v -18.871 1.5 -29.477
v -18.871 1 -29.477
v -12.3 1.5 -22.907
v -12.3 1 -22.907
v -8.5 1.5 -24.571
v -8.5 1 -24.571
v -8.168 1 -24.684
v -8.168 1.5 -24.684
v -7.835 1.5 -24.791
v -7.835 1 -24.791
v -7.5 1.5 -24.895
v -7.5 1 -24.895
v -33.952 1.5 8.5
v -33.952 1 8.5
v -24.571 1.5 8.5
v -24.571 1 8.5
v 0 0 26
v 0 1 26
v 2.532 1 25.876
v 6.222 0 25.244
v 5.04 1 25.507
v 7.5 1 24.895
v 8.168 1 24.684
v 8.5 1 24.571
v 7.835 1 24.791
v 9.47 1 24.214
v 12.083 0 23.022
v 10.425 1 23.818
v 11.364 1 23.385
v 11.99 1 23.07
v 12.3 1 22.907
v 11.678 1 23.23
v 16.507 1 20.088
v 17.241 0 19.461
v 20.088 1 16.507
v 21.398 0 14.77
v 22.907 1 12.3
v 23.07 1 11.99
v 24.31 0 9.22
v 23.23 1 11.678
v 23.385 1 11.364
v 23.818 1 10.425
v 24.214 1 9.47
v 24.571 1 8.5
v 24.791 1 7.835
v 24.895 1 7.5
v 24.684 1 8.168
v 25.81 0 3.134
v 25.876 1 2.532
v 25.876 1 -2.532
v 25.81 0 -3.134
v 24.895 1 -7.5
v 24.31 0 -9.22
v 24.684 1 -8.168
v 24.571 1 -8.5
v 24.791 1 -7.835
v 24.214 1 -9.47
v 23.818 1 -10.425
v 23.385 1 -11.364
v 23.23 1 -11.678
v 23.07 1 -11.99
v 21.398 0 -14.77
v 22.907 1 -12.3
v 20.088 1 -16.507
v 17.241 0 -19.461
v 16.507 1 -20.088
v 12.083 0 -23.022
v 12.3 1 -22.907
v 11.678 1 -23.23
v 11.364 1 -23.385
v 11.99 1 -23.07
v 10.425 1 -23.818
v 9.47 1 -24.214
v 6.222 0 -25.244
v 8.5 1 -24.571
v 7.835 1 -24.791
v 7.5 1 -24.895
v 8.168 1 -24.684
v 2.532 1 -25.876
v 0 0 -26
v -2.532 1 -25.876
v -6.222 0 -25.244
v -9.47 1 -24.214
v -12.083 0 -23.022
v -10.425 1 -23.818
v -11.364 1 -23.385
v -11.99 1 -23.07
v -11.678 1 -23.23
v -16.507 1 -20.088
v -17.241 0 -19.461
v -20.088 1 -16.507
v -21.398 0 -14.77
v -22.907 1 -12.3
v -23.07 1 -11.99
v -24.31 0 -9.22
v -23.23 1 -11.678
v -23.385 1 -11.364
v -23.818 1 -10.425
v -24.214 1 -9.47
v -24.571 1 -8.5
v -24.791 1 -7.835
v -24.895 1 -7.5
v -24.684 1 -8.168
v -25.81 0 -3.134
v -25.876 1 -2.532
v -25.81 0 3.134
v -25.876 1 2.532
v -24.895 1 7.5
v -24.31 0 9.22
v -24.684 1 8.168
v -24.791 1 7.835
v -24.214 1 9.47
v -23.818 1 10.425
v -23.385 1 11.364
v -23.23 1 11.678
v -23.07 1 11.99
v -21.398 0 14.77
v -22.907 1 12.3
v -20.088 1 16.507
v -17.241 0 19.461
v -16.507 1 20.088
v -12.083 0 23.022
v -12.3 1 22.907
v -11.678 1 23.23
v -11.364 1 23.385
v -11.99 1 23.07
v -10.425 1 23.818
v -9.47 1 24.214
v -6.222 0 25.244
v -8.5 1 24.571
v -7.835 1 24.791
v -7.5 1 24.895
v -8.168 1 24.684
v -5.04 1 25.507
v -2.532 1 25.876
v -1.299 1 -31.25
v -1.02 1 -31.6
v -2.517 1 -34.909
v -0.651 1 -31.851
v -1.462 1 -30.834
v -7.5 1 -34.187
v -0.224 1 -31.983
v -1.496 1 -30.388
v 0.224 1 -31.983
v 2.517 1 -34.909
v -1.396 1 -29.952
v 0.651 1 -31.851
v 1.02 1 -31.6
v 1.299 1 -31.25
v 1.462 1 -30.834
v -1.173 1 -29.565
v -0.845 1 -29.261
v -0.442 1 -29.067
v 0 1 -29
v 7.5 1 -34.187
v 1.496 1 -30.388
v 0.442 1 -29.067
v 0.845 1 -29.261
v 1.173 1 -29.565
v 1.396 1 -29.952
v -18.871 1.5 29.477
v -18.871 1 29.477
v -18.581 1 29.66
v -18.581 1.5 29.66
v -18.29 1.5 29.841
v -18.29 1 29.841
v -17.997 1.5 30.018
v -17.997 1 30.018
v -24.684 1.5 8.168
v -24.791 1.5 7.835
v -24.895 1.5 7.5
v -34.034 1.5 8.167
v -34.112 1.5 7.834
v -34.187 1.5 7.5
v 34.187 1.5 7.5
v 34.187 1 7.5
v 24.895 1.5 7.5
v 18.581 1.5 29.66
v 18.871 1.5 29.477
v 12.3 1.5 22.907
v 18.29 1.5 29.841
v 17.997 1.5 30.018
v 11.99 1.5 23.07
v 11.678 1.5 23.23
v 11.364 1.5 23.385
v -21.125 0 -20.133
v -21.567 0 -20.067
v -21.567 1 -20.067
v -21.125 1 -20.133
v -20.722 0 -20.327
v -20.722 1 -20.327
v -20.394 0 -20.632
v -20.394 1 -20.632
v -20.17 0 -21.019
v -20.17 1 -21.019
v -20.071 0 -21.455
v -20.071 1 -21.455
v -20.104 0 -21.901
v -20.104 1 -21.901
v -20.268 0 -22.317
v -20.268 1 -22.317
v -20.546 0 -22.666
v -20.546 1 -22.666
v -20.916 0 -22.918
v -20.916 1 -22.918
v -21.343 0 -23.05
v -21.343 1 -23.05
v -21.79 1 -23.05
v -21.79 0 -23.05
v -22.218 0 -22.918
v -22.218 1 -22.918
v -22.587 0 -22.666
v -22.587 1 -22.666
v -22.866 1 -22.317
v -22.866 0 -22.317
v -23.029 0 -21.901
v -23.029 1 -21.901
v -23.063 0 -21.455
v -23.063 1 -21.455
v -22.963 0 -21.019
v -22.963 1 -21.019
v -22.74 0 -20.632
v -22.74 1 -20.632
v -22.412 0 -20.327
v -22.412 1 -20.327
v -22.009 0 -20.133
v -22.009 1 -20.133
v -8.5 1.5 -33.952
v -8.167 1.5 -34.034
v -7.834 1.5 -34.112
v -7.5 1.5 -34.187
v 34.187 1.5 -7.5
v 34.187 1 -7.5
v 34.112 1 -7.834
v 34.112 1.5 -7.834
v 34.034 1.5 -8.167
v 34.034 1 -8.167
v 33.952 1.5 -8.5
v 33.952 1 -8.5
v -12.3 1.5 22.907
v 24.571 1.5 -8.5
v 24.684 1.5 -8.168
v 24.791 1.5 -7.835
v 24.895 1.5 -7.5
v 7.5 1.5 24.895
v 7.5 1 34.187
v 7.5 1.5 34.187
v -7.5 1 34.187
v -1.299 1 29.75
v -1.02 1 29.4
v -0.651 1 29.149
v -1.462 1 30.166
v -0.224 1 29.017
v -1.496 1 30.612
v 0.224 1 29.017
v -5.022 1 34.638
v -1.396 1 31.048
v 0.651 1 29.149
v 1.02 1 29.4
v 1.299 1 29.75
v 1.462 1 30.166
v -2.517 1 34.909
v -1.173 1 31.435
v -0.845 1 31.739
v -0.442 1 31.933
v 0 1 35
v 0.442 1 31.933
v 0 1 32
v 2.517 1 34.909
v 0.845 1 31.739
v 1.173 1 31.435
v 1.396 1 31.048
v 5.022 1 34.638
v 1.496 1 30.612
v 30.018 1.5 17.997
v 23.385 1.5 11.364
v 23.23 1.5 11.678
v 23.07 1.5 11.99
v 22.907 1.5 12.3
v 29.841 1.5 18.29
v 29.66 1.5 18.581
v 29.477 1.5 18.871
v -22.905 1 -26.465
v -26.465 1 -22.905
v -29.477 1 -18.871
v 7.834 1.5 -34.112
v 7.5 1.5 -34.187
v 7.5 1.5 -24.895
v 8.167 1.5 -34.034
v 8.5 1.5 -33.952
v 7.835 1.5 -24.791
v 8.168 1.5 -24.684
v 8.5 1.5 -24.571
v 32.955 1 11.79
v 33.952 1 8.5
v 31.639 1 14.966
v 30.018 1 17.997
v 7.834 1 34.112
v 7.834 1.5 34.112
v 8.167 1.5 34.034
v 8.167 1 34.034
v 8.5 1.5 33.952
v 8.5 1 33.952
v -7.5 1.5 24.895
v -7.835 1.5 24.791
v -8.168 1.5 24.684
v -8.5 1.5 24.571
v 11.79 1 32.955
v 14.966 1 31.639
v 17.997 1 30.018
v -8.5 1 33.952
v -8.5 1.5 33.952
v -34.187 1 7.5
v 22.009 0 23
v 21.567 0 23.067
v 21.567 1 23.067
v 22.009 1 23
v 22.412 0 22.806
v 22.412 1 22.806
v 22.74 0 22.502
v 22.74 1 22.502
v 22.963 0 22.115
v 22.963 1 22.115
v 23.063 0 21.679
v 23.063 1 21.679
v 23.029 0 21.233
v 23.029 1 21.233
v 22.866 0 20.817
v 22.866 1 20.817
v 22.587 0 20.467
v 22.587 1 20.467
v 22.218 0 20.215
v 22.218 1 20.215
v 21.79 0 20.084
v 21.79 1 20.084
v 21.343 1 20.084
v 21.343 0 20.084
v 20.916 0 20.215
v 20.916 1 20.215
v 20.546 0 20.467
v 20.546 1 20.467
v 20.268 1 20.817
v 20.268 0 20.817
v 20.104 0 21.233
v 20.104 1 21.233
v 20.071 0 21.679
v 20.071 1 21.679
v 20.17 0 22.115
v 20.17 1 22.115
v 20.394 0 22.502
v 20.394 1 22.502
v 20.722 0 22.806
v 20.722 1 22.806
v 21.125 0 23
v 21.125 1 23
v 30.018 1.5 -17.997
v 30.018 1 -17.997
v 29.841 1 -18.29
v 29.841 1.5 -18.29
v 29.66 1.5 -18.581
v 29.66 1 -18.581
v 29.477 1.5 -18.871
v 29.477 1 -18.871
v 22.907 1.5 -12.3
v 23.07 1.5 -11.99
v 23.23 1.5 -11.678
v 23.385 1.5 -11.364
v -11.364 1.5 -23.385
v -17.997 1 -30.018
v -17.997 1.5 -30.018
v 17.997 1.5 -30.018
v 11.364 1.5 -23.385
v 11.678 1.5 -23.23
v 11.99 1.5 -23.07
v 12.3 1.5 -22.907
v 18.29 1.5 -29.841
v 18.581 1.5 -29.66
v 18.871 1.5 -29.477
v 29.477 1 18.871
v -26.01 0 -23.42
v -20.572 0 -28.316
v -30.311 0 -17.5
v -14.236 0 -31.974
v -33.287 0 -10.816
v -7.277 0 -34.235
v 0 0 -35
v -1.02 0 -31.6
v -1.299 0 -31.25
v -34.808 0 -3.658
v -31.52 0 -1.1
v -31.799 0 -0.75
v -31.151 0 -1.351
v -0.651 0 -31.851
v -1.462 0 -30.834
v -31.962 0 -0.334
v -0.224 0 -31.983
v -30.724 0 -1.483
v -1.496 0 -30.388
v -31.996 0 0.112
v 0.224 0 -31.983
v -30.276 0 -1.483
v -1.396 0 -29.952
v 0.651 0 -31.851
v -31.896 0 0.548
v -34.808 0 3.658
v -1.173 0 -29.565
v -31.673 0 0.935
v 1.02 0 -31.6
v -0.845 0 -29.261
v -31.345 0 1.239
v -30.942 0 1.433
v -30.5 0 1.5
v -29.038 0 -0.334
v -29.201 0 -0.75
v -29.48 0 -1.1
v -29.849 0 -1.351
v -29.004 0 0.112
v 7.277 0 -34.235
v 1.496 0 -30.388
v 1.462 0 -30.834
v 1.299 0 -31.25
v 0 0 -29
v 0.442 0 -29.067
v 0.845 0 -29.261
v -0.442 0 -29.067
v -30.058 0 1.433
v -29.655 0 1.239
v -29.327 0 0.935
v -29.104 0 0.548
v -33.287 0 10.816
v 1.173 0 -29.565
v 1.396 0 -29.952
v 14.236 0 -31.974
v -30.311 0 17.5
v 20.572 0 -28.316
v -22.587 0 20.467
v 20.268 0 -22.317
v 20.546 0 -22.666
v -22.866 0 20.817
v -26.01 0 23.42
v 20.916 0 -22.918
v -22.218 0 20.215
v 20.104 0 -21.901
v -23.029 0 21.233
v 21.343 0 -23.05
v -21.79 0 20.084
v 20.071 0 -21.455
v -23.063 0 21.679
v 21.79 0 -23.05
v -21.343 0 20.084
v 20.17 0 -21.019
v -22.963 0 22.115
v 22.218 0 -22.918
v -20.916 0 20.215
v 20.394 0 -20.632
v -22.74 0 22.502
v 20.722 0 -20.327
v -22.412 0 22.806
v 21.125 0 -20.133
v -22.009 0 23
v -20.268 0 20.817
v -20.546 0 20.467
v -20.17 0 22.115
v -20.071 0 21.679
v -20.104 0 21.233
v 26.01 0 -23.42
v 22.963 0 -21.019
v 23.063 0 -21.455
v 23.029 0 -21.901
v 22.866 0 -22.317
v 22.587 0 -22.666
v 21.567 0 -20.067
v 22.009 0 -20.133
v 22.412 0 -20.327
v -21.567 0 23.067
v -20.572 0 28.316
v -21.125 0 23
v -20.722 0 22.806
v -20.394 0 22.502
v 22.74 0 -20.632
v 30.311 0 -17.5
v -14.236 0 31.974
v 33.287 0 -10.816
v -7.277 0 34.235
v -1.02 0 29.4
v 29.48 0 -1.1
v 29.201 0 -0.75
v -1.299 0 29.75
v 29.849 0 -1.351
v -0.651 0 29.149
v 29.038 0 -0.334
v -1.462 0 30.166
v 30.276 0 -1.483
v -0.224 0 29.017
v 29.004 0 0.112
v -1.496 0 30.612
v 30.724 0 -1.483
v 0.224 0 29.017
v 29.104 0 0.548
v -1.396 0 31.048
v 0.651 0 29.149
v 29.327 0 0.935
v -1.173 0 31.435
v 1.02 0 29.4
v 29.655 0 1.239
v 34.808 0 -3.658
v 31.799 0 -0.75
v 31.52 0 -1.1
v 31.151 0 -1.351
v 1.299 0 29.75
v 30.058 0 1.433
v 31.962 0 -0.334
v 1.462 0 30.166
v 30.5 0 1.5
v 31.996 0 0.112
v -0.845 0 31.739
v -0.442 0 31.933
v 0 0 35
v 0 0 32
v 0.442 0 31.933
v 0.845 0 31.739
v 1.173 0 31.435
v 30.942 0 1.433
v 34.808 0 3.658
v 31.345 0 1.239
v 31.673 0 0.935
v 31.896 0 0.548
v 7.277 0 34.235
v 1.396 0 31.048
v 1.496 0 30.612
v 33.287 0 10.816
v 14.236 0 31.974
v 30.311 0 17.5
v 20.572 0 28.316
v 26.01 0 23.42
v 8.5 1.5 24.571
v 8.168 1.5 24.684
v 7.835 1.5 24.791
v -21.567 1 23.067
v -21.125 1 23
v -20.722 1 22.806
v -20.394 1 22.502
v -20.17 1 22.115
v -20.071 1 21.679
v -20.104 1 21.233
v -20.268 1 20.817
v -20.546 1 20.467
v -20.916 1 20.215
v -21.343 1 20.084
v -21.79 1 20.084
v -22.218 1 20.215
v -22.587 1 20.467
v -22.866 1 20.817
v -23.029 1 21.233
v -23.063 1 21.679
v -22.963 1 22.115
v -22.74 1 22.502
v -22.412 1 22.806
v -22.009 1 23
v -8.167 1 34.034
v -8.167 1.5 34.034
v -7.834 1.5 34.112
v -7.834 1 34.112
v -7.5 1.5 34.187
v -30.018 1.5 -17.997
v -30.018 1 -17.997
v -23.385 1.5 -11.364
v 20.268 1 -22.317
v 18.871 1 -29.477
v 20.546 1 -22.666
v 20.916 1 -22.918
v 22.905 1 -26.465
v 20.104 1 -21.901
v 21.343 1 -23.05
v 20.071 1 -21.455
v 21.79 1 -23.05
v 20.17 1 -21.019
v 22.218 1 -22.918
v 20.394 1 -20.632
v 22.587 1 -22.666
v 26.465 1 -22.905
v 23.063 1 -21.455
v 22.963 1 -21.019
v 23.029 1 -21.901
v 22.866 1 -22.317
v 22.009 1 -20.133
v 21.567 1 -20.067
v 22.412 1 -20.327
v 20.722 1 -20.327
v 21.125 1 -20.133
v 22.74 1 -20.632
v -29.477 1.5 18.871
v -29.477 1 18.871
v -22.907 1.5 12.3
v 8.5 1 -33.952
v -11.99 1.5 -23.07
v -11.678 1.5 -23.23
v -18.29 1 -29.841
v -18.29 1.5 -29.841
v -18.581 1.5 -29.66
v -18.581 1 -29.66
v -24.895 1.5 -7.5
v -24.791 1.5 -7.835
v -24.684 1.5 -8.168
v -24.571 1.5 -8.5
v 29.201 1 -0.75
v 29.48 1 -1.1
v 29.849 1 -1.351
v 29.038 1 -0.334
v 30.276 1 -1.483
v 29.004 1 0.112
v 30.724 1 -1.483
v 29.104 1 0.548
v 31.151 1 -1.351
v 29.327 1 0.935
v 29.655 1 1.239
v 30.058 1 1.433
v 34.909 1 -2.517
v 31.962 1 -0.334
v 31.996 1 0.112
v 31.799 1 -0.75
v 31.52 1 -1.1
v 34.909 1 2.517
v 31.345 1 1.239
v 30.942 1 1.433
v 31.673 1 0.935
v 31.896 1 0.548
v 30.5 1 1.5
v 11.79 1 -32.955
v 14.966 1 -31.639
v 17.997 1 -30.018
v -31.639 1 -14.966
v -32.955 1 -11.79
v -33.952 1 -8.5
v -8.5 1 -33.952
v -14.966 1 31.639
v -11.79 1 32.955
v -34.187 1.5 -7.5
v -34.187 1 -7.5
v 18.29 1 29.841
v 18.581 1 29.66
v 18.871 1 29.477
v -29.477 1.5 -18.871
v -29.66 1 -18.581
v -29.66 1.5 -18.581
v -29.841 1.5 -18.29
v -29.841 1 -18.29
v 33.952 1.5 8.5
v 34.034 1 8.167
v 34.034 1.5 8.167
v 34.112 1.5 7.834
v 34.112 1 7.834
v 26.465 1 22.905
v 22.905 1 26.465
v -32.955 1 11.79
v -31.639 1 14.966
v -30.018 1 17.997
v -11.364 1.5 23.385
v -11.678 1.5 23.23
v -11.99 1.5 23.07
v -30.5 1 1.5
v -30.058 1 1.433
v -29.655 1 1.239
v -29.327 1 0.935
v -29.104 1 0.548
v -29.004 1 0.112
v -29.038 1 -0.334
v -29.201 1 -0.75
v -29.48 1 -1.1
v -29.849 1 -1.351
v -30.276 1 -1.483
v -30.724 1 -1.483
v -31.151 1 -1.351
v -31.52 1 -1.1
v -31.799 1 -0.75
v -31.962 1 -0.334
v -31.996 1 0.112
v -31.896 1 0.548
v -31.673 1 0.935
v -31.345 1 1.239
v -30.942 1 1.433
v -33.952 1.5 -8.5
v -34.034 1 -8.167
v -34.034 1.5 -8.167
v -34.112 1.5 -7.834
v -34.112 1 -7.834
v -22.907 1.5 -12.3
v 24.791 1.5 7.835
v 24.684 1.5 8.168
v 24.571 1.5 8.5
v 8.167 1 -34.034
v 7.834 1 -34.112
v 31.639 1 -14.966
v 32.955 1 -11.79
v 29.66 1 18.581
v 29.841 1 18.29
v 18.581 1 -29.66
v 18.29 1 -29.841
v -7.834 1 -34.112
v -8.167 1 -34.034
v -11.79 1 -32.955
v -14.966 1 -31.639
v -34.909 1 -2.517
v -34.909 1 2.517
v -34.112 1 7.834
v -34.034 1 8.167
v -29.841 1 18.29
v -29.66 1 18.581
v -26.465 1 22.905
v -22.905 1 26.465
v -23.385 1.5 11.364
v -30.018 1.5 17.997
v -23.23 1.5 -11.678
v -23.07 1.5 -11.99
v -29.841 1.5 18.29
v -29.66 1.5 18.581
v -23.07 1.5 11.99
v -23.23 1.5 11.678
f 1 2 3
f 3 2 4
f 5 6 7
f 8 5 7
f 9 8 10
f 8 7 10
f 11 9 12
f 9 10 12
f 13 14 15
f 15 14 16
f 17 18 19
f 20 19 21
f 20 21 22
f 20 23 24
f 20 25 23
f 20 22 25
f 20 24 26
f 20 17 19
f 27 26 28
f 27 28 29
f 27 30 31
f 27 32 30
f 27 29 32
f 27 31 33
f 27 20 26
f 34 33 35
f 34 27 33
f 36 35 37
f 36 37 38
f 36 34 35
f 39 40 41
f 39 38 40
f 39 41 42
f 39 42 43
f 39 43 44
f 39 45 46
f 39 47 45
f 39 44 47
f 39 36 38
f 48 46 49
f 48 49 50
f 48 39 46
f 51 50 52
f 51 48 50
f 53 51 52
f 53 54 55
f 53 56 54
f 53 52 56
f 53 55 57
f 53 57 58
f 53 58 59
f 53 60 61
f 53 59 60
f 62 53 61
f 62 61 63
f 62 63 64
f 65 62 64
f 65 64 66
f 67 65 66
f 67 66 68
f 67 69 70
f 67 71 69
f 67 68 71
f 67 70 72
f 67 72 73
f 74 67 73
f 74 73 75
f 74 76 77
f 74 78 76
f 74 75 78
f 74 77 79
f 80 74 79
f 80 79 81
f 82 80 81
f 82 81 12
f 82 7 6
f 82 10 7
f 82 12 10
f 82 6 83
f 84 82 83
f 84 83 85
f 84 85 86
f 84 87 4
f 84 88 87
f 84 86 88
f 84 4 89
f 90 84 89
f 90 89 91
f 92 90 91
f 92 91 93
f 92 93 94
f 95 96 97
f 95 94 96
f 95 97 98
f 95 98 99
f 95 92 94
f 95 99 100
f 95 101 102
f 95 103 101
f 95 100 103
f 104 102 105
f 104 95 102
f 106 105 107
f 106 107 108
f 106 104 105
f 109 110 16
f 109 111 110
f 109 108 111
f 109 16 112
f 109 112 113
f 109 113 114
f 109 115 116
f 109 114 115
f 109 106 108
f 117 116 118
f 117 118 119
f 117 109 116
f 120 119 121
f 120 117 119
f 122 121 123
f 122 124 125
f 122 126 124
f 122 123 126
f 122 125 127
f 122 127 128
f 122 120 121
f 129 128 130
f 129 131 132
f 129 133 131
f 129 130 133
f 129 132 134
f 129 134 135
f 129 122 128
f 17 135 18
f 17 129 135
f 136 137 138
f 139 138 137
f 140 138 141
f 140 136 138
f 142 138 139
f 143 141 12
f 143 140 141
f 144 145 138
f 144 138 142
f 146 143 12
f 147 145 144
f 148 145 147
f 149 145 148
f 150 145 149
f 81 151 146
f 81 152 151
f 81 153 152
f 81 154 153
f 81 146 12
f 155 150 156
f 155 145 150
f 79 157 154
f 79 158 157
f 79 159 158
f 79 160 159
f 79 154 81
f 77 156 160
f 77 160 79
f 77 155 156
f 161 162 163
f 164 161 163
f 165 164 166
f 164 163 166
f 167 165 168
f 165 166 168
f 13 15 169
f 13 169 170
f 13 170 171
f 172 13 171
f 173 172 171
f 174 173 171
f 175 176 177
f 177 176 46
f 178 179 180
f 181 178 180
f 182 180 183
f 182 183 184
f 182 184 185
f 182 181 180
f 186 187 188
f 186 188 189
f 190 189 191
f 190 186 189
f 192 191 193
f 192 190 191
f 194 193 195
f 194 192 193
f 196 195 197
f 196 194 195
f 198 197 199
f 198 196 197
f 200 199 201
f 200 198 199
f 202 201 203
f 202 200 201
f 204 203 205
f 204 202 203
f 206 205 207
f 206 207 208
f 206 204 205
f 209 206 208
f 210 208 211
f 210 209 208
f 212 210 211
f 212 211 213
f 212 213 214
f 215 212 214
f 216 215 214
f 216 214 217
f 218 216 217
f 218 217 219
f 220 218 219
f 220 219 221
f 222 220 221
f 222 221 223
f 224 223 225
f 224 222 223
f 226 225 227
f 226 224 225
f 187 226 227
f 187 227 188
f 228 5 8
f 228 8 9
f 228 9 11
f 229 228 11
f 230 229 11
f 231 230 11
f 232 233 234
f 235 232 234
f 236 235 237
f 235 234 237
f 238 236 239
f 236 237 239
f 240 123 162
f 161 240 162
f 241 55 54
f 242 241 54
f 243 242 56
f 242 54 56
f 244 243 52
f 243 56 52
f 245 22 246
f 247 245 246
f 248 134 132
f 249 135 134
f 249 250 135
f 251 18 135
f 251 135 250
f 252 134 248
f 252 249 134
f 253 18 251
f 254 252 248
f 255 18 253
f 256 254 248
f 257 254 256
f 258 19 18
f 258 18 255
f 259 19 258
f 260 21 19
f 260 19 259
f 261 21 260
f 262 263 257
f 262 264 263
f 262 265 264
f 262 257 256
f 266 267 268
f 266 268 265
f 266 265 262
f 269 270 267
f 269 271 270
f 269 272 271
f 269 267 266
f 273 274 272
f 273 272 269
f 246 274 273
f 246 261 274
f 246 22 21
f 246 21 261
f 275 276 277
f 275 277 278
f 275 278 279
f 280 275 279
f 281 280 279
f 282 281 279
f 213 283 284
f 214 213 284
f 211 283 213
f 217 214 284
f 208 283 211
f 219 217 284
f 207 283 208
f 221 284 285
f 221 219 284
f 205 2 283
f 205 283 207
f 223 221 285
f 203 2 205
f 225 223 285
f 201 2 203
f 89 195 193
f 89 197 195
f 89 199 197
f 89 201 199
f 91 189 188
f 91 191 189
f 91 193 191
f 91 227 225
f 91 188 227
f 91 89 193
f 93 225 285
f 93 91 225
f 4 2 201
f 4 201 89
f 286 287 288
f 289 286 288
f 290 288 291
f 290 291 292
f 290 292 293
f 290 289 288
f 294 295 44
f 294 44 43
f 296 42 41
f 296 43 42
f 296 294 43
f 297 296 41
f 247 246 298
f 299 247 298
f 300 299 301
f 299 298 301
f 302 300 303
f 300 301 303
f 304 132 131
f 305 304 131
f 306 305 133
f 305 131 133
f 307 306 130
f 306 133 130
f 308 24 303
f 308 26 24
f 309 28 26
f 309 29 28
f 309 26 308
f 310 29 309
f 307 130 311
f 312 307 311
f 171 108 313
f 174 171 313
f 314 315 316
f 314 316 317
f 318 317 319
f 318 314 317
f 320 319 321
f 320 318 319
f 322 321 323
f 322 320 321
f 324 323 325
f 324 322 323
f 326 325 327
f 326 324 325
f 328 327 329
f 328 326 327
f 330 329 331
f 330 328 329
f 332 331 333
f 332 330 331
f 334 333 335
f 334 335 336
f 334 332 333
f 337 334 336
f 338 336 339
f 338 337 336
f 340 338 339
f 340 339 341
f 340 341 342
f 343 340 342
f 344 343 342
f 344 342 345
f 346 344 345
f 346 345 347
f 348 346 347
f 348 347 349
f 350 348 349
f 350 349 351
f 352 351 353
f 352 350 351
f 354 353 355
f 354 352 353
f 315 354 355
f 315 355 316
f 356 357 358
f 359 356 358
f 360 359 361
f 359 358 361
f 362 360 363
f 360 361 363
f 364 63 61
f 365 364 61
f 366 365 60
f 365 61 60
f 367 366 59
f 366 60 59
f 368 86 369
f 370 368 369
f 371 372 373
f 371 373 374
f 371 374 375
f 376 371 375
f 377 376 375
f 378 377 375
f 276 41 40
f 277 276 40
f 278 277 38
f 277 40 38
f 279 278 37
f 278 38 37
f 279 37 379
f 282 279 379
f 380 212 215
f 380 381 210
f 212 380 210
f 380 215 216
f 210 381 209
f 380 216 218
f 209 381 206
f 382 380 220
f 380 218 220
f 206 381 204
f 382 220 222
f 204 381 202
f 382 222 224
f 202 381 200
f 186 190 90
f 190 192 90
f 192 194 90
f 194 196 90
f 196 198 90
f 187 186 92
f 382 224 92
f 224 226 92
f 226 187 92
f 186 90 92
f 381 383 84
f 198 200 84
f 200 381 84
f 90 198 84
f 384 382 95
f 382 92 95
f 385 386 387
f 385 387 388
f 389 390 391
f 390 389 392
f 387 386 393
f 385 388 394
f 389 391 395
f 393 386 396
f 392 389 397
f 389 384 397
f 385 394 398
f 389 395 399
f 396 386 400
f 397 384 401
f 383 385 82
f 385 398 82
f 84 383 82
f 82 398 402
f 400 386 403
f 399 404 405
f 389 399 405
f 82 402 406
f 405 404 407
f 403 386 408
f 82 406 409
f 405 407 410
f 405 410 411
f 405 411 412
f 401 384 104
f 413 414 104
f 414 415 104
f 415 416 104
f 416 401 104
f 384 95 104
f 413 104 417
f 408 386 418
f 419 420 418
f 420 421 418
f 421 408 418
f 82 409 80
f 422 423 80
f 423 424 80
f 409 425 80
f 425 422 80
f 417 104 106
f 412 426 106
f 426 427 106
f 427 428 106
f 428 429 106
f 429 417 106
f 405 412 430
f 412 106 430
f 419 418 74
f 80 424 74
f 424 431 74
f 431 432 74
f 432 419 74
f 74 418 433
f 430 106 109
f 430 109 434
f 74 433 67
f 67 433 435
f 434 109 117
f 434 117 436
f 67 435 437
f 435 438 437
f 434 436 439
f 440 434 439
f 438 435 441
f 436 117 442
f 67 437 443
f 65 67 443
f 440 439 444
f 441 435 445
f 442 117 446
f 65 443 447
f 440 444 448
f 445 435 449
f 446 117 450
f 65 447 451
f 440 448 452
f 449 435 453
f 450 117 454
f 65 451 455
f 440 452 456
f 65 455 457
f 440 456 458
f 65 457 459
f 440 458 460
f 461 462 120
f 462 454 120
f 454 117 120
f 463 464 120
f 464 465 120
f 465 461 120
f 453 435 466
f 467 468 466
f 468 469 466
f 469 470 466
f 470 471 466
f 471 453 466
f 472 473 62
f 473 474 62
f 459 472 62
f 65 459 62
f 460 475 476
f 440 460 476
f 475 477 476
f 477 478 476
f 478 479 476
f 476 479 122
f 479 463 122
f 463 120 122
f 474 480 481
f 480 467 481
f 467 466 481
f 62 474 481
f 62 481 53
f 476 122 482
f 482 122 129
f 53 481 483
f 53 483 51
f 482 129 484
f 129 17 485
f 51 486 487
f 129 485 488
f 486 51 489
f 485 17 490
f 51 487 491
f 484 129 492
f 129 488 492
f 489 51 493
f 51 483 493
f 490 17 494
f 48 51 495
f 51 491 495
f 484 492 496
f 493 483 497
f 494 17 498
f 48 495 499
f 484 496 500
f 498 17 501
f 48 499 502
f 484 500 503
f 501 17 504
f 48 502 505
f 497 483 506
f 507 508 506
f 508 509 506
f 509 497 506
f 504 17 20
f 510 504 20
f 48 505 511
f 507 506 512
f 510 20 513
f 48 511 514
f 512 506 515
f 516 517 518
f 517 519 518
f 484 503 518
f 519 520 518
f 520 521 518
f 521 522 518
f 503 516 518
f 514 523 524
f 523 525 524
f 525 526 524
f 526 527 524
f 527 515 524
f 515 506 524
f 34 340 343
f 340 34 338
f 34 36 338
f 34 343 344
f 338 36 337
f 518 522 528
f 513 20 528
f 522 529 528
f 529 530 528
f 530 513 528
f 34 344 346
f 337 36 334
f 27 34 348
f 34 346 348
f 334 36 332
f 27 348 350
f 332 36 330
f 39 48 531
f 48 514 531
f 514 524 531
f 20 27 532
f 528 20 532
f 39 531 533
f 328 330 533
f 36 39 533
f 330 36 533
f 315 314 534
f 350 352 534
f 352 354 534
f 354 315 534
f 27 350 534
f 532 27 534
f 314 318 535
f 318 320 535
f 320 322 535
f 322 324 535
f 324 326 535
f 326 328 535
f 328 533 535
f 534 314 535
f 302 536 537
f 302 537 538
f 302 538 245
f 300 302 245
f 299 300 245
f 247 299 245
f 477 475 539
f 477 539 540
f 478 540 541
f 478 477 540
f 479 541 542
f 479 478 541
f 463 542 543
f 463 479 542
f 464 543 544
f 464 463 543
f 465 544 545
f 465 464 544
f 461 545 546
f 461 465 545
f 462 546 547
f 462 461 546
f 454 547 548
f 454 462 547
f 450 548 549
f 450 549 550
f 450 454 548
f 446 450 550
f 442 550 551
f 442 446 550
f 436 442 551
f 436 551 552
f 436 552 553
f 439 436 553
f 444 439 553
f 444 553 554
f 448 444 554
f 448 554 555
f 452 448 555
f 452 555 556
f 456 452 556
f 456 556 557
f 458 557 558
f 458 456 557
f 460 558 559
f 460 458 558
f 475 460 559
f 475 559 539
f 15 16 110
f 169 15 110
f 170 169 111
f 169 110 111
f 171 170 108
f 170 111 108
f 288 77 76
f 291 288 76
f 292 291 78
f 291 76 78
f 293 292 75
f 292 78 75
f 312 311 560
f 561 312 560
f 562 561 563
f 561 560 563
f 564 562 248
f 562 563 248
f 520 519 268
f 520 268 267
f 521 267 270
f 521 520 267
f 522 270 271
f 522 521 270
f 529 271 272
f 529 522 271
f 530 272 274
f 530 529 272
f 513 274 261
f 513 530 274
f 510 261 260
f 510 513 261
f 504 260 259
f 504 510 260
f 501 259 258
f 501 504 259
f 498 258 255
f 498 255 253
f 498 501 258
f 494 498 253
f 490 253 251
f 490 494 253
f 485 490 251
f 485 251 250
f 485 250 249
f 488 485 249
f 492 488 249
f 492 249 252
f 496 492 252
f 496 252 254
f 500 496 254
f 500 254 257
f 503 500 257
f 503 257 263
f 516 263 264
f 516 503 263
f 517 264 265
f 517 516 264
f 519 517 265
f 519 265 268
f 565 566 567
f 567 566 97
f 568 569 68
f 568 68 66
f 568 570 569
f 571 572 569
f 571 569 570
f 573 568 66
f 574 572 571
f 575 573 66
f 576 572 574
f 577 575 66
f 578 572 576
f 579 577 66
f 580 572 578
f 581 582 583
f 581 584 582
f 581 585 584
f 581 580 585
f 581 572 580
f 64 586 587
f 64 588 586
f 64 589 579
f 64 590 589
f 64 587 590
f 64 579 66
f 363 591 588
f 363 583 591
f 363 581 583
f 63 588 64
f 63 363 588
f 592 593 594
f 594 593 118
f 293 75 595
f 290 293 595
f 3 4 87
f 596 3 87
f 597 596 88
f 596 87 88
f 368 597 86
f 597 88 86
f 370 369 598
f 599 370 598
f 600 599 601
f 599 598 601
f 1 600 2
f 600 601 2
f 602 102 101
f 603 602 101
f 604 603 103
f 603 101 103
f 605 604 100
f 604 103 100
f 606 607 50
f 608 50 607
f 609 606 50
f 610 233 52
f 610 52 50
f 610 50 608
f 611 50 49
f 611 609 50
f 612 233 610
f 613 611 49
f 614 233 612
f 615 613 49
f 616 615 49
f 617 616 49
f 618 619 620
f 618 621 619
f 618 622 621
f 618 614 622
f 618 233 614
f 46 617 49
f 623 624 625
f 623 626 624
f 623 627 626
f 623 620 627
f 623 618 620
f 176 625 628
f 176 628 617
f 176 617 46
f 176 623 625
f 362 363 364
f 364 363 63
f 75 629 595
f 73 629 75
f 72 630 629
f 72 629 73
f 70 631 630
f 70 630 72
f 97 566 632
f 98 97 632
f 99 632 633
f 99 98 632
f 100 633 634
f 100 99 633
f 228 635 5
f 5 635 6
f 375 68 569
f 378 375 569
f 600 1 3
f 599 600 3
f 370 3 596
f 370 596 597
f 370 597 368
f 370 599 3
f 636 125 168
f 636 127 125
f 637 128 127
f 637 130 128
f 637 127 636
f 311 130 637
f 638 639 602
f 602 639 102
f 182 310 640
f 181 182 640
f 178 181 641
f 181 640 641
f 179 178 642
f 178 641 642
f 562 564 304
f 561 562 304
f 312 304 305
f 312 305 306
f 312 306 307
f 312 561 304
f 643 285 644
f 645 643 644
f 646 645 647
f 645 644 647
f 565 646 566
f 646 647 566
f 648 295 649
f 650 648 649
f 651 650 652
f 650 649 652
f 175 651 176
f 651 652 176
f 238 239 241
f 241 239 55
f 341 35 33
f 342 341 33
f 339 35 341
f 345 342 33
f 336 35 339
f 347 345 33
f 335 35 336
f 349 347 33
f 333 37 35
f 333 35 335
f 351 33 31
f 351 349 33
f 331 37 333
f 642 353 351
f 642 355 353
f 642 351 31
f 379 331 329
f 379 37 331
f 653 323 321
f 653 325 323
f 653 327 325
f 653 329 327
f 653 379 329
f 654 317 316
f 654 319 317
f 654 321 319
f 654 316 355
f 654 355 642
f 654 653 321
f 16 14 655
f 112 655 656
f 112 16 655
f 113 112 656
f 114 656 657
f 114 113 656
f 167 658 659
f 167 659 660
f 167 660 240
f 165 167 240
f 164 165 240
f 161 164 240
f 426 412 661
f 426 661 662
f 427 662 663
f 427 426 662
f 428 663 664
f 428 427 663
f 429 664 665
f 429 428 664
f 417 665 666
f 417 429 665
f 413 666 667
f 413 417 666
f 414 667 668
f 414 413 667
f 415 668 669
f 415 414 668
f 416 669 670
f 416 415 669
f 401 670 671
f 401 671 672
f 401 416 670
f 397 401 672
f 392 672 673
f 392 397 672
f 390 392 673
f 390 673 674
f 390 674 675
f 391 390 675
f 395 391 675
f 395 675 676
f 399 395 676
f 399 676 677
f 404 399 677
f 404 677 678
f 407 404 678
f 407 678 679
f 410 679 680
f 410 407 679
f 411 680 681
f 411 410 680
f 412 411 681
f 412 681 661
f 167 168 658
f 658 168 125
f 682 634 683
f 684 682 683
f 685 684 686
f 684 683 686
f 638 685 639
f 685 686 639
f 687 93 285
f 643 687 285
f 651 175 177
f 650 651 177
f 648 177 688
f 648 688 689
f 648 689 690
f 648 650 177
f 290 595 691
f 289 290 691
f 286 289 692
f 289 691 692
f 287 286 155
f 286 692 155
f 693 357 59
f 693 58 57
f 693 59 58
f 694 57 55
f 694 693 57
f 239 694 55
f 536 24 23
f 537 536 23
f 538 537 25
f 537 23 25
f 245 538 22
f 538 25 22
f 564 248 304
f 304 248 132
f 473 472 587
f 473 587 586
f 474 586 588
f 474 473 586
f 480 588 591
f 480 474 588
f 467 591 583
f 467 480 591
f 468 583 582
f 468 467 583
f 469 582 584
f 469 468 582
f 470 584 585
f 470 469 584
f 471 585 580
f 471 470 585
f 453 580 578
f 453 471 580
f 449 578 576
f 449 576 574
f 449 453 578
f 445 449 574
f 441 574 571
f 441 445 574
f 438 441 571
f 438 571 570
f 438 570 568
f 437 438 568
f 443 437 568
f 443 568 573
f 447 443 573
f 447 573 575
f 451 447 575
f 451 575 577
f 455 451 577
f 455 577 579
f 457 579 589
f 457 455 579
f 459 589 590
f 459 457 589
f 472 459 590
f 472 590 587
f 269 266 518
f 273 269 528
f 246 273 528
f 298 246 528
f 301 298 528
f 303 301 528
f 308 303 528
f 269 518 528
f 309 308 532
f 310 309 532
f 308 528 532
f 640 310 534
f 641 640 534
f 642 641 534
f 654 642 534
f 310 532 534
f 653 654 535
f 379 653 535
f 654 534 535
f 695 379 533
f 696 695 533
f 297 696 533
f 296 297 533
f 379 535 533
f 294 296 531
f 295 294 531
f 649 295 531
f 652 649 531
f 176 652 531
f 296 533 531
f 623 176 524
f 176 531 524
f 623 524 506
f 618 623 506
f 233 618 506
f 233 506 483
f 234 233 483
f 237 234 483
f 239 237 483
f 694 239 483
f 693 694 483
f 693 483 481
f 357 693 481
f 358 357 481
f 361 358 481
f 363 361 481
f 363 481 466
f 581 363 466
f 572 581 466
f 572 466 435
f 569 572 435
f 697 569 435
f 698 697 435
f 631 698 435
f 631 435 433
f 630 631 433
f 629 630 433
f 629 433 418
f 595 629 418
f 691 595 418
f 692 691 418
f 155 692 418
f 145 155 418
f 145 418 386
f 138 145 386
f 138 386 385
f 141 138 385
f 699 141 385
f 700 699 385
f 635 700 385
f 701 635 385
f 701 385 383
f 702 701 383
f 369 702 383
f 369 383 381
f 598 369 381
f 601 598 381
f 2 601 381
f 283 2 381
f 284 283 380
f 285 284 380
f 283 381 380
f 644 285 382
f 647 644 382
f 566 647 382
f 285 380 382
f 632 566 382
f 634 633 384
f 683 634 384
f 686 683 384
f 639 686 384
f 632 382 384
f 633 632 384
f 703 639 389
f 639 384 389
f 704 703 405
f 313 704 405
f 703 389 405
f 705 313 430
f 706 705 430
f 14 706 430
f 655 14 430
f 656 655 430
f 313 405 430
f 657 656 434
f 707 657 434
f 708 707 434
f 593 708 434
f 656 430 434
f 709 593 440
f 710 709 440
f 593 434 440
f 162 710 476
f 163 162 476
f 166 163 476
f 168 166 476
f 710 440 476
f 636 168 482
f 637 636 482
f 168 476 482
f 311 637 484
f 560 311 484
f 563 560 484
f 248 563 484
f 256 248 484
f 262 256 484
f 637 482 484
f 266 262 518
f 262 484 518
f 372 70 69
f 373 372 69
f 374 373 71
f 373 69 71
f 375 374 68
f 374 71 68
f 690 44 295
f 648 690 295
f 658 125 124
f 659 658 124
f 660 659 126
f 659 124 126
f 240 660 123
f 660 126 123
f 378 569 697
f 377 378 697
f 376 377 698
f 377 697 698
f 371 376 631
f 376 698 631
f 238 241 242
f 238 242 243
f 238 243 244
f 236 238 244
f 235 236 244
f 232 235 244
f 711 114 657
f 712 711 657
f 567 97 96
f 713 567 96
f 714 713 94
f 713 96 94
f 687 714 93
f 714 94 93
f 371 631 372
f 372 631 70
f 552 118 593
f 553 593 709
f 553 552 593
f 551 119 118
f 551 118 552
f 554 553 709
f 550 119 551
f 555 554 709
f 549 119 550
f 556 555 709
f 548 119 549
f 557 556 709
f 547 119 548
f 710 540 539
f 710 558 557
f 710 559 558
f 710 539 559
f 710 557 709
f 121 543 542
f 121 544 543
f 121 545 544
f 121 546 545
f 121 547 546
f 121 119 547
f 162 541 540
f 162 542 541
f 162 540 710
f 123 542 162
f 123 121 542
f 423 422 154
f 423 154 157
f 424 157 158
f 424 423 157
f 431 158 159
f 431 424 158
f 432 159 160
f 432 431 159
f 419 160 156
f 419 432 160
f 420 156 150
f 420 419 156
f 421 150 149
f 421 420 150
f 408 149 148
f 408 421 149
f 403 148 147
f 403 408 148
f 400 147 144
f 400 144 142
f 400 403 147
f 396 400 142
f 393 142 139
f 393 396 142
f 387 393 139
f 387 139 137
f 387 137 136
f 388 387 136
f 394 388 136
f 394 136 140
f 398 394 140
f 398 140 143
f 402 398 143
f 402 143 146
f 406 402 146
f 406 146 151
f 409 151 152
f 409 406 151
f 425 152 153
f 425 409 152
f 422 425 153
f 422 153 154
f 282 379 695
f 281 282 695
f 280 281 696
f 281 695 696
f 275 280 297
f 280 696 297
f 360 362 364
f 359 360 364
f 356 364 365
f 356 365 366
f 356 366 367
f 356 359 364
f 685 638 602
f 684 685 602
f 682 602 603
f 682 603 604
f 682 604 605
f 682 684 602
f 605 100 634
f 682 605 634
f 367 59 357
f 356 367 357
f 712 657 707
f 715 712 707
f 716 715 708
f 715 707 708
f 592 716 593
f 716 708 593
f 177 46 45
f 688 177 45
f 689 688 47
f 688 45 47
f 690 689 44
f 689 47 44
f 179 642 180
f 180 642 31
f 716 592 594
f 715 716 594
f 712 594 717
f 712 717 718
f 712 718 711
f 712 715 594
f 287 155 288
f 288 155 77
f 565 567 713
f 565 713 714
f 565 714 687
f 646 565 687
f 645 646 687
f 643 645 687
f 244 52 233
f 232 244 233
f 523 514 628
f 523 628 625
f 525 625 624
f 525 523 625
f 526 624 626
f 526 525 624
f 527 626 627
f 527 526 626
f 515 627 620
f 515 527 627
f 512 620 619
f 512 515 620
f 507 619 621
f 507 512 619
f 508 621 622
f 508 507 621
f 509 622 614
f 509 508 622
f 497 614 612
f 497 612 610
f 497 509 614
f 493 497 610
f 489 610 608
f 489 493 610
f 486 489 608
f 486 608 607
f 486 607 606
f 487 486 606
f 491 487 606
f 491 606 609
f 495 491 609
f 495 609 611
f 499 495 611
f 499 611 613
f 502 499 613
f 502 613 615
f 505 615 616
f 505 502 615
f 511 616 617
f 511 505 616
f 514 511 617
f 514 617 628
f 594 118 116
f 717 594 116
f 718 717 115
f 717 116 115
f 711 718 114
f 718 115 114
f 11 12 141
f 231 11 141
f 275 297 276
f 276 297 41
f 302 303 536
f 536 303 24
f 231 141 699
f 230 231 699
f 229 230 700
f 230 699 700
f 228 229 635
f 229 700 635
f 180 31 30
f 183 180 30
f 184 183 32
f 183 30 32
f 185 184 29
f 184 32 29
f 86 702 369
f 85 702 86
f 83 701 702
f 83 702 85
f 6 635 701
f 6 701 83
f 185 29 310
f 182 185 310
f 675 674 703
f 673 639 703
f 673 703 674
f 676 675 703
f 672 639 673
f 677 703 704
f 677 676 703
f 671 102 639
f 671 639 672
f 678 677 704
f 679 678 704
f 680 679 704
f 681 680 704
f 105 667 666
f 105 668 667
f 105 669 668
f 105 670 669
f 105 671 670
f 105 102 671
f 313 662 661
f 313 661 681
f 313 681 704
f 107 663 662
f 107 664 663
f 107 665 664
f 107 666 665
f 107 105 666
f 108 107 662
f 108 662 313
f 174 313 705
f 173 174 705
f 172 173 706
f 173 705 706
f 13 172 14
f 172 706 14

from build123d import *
from build123d.topology import SkipClean

# Parameters (mm, degrees)
SKETCH_1_R               = 35
SKETCH_1_R_2             = 26
SKETCH_1_R_3             = 1.5
EXTRUDE_1_DEPTH          = 1
EXTRUDE_2_DEPTH          = 0.5
PATTERN_CIRCULAR_1_COUNT = 8


with BuildPart() as part:
    # Эскиз1 → Бобышка-Вытянуть1 (new body)
    with BuildSketch(Plane(origin=(0, 0, 0), x_dir=(1, 0, 0), z_dir=(0, 1, 0))):
        with Locations(Location((0, 0, 0), (0, 0, 270))):
            Circle(SKETCH_1_R)
        with Locations(Location((0, 0, 0), (0, 0, 270))):
            Circle(SKETCH_1_R_2, mode=Mode.SUBTRACT)
        with Locations(Location((0, 30.5, 0), (0, 0, 270))):
            Circle(SKETCH_1_R_3, mode=Mode.SUBTRACT)
        with Locations(Location((21.566756826, 21.566756826, 0), (0, 0, 270))):
            Circle(SKETCH_1_R_3, mode=Mode.SUBTRACT)
        with Locations(Location((30.5, 0, 0), (0, 0, 270))):
            Circle(SKETCH_1_R_3, mode=Mode.SUBTRACT)
        with Locations(Location((21.566756826, -21.566756826, 0), (0, 0, 270))):
            Circle(SKETCH_1_R_3, mode=Mode.SUBTRACT)
        with Locations(Location((0, -30.5, 0), (0, 0, 270))):
            Circle(SKETCH_1_R_3, mode=Mode.SUBTRACT)
        with Locations(Location((-21.566756826, -21.566756826, 0), (0, 0, 270))):
            Circle(SKETCH_1_R_3, mode=Mode.SUBTRACT)
        with Locations(Location((-30.5, 0, 0), (0, 0, 270))):
            Circle(SKETCH_1_R_3, mode=Mode.SUBTRACT)
        with Locations(Location((-21.566756826, 21.566756826, 0), (0, 0, 270))):
            Circle(SKETCH_1_R_3, mode=Mode.SUBTRACT)
    extrude(amount=EXTRUDE_1_DEPTH)

    # Эскиз2 → Бобышка-Вытянуть2 (add)
    with SkipClean():  # the faces are left unmerged after this step: merging them gives an invalid solid
        with BuildSketch(Plane(origin=(0, 1, 0), x_dir=(1, 0, 0), z_dir=(0, 1, 0))):
            with BuildLine():
                ThreePointArc((-7.5, 34.186985828), (-8.000861476, 34.0732478), (-8.5, 33.952172243))
                Line((-8.5, 33.952172243), (-8.5, 24.571324751))
                ThreePointArc((-8.5, 24.571324751), (-8.001634558, 24.738105109), (-7.5, 24.894778569))
                Line((-7.5, 24.894778569), (-7.5, 34.186985828))
            make_face()
            with BuildLine():
                ThreePointArc((8.5, 33.952172243), (8.000861476, 34.0732478), (7.5, 34.186985828))
                Line((7.5, 34.186985828), (7.5, 24.894778569))
                ThreePointArc((7.5, 24.894778569), (8.001634558, 24.738105109), (8.5, 24.571324751))
                Line((8.5, 24.571324751), (8.5, 33.952172243))
            make_face()
        extrude_2 = extrude(amount=EXTRUDE_2_DEPTH)

    # Круговой массив1: Бобышка-Вытянуть2 ×8 about axis
    with SkipClean():  # the faces are left unmerged after this step: merging them gives an invalid solid
        pattern_circular_1_axis = Axis((0, 0, 0), (0, 1, 0))
        for i in range(1, PATTERN_CIRCULAR_1_COUNT):
            add(extrude_2.rotate(pattern_circular_1_axis, i * 360 / PATTERN_CIRCULAR_1_COUNT))


solid = part.part
